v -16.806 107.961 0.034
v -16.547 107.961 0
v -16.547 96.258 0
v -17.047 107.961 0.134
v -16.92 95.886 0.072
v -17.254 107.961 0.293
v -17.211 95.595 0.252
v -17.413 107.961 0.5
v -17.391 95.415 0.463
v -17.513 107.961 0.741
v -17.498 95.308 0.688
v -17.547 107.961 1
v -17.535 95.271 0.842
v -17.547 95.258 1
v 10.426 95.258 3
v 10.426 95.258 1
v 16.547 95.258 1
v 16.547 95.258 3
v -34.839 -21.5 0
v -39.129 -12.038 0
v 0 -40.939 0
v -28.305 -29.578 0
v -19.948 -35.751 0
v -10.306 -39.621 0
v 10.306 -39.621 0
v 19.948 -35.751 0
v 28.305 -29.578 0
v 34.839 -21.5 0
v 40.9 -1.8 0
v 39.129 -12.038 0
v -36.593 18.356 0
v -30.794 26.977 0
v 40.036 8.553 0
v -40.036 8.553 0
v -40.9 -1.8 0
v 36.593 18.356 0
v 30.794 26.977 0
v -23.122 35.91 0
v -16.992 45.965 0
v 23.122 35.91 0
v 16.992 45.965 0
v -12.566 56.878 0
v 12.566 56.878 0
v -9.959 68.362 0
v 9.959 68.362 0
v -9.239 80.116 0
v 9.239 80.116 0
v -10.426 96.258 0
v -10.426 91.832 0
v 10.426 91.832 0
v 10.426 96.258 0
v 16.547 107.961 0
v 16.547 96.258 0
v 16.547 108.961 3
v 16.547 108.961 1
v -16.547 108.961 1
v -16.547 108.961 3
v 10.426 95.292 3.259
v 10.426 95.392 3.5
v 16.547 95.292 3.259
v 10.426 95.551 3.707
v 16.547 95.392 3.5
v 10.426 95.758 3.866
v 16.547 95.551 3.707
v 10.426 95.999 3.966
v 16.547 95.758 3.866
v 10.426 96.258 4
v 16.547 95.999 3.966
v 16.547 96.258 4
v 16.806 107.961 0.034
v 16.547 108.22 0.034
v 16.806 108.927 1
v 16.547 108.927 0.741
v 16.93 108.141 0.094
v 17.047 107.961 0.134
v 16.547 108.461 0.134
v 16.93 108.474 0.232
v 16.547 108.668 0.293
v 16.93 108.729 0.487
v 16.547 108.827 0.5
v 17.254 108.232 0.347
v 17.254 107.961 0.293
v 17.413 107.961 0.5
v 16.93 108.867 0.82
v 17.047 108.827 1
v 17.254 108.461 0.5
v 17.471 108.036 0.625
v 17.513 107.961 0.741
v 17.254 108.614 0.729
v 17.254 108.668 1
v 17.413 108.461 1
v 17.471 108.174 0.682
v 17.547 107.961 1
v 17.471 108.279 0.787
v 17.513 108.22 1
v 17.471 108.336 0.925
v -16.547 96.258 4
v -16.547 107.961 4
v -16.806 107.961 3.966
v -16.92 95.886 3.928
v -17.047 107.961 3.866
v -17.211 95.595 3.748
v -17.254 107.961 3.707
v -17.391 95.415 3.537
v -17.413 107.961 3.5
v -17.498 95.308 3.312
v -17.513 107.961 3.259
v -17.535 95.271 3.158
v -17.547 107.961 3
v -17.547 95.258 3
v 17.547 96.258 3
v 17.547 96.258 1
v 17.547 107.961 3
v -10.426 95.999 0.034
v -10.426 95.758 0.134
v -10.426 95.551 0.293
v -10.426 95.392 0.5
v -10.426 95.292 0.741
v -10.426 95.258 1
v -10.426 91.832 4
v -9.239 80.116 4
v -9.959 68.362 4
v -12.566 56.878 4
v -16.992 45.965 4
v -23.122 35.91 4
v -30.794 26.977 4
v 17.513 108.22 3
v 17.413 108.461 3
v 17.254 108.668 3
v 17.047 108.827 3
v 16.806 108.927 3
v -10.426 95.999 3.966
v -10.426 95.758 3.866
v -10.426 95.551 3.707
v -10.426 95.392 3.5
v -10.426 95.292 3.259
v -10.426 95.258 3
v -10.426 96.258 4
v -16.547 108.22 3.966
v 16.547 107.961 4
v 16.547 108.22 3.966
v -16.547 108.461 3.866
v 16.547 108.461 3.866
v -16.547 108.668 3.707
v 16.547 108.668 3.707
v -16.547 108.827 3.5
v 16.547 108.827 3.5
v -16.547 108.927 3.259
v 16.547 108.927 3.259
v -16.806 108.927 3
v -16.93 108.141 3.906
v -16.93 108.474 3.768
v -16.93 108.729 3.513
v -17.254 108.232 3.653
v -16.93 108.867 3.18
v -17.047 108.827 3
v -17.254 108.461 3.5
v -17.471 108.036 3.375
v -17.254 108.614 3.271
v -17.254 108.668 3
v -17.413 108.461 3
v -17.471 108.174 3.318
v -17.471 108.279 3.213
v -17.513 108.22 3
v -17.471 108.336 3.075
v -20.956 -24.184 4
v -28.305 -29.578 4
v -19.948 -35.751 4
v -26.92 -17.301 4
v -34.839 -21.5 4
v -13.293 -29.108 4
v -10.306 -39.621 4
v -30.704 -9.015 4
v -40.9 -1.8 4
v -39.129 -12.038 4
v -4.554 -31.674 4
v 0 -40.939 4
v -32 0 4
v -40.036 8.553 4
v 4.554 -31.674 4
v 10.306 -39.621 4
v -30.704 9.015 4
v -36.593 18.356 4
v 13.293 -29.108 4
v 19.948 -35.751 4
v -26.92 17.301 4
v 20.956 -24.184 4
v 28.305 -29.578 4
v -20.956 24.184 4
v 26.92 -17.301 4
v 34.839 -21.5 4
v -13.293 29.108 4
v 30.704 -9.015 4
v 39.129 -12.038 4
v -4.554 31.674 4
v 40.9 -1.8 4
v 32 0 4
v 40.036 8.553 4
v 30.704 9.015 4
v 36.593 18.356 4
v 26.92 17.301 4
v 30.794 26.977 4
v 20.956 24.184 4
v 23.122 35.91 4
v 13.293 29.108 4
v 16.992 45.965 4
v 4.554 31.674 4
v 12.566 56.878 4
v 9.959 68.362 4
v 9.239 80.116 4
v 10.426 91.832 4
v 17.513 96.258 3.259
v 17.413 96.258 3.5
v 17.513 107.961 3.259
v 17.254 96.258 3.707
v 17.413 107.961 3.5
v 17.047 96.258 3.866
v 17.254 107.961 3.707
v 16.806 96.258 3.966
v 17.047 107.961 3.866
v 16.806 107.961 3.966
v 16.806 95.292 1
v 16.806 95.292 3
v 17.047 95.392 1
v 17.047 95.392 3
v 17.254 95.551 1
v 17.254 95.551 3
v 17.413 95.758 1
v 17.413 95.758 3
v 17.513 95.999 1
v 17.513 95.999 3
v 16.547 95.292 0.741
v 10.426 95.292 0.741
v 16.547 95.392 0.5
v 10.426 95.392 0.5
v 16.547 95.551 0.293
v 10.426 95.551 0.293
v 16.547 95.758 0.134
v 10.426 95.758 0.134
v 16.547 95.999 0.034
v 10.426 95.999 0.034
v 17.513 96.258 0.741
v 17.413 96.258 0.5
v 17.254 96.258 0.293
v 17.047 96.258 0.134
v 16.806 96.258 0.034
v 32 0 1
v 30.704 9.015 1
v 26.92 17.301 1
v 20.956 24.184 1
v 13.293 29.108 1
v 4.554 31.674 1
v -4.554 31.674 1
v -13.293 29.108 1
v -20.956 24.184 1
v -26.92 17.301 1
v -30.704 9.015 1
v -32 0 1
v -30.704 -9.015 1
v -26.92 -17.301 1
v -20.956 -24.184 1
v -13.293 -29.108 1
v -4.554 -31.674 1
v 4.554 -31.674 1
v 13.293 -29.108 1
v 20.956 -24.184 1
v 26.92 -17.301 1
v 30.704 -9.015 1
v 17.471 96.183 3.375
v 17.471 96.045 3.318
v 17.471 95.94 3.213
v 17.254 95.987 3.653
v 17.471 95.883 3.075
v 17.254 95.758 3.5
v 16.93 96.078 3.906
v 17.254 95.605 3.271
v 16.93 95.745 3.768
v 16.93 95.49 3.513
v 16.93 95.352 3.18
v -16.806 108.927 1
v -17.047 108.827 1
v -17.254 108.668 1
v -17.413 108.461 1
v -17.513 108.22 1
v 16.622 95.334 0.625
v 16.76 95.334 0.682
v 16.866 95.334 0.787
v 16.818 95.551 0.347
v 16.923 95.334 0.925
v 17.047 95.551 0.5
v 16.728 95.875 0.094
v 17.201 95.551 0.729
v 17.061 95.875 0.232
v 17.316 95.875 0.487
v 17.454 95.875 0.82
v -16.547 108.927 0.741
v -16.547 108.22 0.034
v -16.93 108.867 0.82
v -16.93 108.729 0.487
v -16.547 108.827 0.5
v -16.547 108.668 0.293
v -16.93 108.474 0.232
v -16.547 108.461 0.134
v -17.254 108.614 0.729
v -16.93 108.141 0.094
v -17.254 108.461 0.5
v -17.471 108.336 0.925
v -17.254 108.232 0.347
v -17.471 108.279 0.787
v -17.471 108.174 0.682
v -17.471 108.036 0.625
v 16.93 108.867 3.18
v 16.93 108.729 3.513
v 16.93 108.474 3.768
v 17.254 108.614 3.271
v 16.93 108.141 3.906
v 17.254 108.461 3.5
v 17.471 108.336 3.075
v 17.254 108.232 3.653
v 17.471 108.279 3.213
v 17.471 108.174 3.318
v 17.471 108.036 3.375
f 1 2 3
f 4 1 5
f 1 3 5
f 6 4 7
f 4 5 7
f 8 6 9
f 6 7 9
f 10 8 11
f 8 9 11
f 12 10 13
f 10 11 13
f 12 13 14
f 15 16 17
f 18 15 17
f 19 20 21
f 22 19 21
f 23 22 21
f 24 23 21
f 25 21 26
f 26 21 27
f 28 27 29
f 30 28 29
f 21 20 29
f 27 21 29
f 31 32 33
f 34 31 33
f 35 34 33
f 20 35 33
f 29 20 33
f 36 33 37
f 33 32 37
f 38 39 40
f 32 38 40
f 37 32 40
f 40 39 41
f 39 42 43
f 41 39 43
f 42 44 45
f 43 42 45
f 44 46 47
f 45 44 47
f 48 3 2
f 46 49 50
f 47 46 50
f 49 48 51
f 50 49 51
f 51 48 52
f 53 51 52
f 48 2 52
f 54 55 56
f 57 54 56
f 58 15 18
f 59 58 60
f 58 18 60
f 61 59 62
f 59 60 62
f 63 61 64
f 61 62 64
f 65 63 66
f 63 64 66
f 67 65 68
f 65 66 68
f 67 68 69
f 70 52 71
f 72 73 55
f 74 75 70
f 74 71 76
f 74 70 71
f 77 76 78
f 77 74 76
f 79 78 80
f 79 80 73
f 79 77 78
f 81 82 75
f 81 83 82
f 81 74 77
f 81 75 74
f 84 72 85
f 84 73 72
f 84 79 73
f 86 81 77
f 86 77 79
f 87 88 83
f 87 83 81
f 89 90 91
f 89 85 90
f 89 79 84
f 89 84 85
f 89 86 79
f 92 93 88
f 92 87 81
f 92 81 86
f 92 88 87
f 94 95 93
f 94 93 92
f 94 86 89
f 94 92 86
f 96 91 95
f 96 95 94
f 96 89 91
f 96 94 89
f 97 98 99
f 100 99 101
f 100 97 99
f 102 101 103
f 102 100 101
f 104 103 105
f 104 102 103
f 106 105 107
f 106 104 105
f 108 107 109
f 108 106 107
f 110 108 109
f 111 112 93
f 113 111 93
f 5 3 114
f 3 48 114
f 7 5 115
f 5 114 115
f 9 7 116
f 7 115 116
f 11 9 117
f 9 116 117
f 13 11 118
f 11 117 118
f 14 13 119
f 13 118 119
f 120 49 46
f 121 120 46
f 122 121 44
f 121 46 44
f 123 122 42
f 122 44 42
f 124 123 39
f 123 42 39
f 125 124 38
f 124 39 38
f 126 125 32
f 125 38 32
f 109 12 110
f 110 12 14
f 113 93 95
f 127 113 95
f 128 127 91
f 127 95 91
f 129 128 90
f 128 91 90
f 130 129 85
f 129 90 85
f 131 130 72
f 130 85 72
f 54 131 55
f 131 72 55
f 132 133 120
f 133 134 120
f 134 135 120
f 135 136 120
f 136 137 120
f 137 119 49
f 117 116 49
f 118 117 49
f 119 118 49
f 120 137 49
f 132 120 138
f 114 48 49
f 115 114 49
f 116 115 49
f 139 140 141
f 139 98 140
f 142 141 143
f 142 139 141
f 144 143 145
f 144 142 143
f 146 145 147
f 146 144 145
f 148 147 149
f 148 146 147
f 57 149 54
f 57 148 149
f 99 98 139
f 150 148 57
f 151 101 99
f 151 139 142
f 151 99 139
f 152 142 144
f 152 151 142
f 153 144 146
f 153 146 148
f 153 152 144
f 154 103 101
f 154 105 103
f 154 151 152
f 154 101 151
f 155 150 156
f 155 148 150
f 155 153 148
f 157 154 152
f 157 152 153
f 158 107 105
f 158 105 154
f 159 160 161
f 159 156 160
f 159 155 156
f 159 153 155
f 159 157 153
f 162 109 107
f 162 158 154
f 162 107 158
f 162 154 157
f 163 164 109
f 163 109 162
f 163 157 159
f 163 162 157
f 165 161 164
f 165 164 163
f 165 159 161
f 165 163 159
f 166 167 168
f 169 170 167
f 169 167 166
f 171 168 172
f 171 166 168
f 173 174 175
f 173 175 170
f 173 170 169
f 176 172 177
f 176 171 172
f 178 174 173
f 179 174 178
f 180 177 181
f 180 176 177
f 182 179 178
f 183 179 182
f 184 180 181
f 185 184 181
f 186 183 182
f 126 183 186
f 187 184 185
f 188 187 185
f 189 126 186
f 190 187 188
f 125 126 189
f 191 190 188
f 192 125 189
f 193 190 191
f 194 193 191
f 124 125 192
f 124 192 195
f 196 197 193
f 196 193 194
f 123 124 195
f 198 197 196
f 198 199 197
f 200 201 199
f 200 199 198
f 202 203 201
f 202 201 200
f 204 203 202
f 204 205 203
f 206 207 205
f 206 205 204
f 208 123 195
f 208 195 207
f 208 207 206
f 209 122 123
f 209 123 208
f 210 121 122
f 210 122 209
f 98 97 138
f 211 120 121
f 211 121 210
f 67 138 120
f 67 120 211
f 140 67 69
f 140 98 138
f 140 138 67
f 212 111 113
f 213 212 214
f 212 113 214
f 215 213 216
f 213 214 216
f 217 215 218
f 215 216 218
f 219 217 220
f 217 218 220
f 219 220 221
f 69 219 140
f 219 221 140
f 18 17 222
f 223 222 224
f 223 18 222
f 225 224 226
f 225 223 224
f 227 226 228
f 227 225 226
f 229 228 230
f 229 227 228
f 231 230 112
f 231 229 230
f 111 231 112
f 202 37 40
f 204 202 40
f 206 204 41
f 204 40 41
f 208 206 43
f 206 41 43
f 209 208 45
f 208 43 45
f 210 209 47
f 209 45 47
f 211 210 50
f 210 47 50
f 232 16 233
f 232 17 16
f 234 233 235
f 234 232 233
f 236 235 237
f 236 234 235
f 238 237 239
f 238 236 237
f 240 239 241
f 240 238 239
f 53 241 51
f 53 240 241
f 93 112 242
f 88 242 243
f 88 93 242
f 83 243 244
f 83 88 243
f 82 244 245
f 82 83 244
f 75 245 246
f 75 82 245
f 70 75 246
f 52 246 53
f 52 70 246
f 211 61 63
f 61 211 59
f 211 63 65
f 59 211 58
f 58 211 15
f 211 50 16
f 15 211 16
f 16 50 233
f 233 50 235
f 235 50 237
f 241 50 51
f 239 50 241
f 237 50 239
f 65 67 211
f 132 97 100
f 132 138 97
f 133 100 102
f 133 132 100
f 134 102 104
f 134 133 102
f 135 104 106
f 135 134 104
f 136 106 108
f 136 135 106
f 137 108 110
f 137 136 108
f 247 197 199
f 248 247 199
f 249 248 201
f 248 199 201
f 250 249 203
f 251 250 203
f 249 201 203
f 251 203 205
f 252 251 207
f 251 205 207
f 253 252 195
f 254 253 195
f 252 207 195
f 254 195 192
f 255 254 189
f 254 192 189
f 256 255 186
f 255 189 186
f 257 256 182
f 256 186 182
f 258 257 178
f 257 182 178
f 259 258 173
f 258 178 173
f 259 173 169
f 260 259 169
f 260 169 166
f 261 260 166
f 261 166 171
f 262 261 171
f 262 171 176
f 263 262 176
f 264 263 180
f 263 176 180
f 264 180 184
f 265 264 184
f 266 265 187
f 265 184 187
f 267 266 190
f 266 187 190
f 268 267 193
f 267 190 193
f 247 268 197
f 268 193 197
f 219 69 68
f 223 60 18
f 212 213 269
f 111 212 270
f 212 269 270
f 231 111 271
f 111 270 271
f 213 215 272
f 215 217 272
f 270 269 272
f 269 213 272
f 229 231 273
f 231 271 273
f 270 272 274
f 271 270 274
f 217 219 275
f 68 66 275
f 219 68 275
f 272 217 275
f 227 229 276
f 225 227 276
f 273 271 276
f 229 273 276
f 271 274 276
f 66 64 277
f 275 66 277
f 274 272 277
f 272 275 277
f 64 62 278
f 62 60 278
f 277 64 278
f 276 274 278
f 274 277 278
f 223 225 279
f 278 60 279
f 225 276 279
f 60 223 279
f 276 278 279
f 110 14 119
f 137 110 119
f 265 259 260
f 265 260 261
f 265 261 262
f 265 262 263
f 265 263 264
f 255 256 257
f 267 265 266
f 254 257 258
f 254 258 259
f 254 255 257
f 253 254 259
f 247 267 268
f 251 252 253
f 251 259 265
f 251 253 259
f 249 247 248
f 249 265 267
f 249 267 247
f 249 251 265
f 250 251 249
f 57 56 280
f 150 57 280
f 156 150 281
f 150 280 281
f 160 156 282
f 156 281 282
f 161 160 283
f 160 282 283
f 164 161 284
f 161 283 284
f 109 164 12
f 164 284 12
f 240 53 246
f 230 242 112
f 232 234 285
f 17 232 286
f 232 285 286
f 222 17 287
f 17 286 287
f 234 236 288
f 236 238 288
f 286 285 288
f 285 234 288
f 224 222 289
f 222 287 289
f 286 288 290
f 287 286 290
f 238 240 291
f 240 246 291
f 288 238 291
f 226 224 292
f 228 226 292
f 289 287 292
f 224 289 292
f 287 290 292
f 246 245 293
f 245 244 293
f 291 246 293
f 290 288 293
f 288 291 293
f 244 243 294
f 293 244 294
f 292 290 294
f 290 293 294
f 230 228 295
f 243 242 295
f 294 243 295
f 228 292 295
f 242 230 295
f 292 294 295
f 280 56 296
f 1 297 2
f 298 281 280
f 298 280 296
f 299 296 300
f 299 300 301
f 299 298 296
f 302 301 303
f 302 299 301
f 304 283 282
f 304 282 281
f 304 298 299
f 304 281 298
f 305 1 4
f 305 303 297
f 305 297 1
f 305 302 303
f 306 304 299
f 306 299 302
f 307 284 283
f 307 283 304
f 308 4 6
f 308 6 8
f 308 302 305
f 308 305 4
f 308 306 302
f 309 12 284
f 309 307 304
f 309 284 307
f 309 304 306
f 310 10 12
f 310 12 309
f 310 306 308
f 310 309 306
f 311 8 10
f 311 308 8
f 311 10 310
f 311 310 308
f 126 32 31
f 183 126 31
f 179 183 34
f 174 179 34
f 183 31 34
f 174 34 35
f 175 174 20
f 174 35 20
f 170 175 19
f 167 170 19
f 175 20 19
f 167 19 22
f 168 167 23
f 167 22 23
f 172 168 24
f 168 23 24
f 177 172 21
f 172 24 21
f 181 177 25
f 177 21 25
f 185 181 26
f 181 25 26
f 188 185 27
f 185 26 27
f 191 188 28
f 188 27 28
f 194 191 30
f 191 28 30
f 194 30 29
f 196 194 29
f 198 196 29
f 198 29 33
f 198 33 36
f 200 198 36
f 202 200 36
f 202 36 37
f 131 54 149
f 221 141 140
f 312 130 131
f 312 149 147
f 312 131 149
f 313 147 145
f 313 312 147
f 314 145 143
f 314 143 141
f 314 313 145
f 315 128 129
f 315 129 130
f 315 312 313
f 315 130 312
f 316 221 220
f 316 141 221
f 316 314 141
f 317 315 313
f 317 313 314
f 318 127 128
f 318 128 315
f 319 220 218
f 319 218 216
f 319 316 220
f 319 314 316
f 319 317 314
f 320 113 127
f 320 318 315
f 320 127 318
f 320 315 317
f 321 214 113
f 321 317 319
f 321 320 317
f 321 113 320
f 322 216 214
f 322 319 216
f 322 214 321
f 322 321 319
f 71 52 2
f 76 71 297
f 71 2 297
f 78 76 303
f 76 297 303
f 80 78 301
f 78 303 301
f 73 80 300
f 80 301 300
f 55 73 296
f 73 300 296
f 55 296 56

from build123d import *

# Parameters (mm, degrees)
EXTRUDE_2_DEPTH     = 4
SKETCH_5_R          = 32
CUT_EXTRUDE_2_DEPTH = 3
FILLET_7_R          = 1
FILLET_8_R          = 1


with BuildPart() as part:
    # 草图4 → 凸台-拉伸2 (new body)
    with BuildSketch(Plane.XY):
        with BuildLine():
            Line((10.426433706, 95.258075622), (17.547383854, 95.258075622))
            Line((17.547383854, 95.258075622), (17.547383854, 108.961036928))
            Line((17.547383854, 108.961036928), (-17.547383854, 108.961036928))
            Line((-17.547383854, 108.961036928), (-17.547383854, 95.258075622))
            Line((-17.547383854, 95.258075622), (-10.426433706, 95.258075622))
            Line((-10.426433706, 95.258075622), (-10.426433706, 91.831524795))
            ThreePointArc((-10.426433706, 91.831524795), (-12.565979517, 56.877826167), (-30.794002854, 26.976691251))
            ThreePointArc((-30.794002854, 26.976691251), (0, -40.939131434), (30.794002854, 26.976691251))
            ThreePointArc((30.794002854, 26.976691251), (12.565979517, 56.877826167), (10.426433706, 91.831524795))
            Line((10.426433706, 91.831524795), (10.426433706, 95.258075622))
        make_face()
    extrude(amount=EXTRUDE_2_DEPTH)

    # 草图5 → 切除-拉伸2 (cut)
    with BuildSketch(Plane.XY.offset(4)):
        Circle(SKETCH_5_R)
    extrude(amount=-CUT_EXTRUDE_2_DEPTH, mode=Mode.SUBTRACT)

    # 圆角7
    fillet_7_edges = [part.edges().sort_by_distance(p)[0] for p in [
        (-13.98690878, 95.258075622, 0),
        (-17.547383854, 102.109556275, 0),
        (0, 108.961036928, 0),
        (17.547383854, 102.109556275, 0),
        (13.98690878, 95.258075622, 4),
        (13.98690878, 95.258075622, 0),
        (17.547383854, 102.109556275, 4),
        (17.547383854, 95.258075622, 2),
        (0, 108.961036928, 4),
        (-17.547383854, 102.109556275, 4),
        (-13.98690878, 95.258075622, 4),
    ]]
    fillet(fillet_7_edges, radius=FILLET_7_R)

    # 圆角8
    # the kernel refuses this fillet: 1 mm, written as the material it takes off along each edge
    with BuildSketch(Plane(origin=(-16.547383854, 107.961036928, 1), x_dir=(0, 1, 0), z_dir=(-1, 0, 0))) as fillet_8_piece_1_section:
        Polygon((0, 0), (FILLET_8_R, 0), (FILLET_8_R, FILLET_8_R), (0, FILLET_8_R), align=None)
    fillet_8_piece_1 = extrude(amount=FILLET_8_R, mode=Mode.PRIVATE)
    fillet_8_piece_1 = fillet_8_piece_1 - Plane(origin=(-16.547383854, 107.961036928, 1), x_dir=(0, -0.7071067811865475, 0.7071067811865475), z_dir=(-1, 0, 0)) * Sphere(FILLET_8_R, mode=Mode.PRIVATE)
    add(fillet_8_piece_1, mode=Mode.SUBTRACT)
    with BuildSketch(Plane(origin=(16.547383854, 107.961036928, 1), x_dir=(0, 1, 0), z_dir=(1, 0, 0))) as fillet_8_piece_2_section:
        Polygon((0, 0), (FILLET_8_R, 0), (FILLET_8_R, -FILLET_8_R), (0, -FILLET_8_R), align=None)
    fillet_8_piece_2 = extrude(amount=FILLET_8_R, mode=Mode.PRIVATE)
    fillet_8_piece_2 = fillet_8_piece_2 - Plane(origin=(16.547383854, 107.961036928, 1), x_dir=(0, -0.7071067811865475, 0.7071067811865475), z_dir=(1, 0, 0)) * Sphere(FILLET_8_R, mode=Mode.PRIVATE)
    add(fillet_8_piece_2, mode=Mode.SUBTRACT)
    with BuildSketch(Plane(origin=(16.547383854, 107.961036928, 3), x_dir=(0, 1, 0), z_dir=(1, 0, 0))) as fillet_8_piece_3_section:
        Polygon((0, 0), (FILLET_8_R, 0), (FILLET_8_R, FILLET_8_R), (0, FILLET_8_R), align=None)
    fillet_8_piece_3 = extrude(amount=FILLET_8_R, mode=Mode.PRIVATE)
    fillet_8_piece_3 = fillet_8_piece_3 - Plane(origin=(16.547383854, 107.961036928, 3), x_dir=(0, -0.7071067811865475, -0.7071067811865475), z_dir=(1, 0, 0)) * Sphere(FILLET_8_R, mode=Mode.PRIVATE)
    add(fillet_8_piece_3, mode=Mode.SUBTRACT)
    with BuildSketch(Plane(origin=(-16.547383854, 107.961036928, 3), x_dir=(0, 1, 0), z_dir=(-1, 0, 0))) as fillet_8_piece_4_section:
        Polygon((0, 0), (FILLET_8_R, 0), (FILLET_8_R, -FILLET_8_R), (0, -FILLET_8_R), align=None)
    fillet_8_piece_4 = extrude(amount=FILLET_8_R, mode=Mode.PRIVATE)
    fillet_8_piece_4 = fillet_8_piece_4 - Plane(origin=(-16.547383854, 107.961036928, 3), x_dir=(0, -0.7071067811865475, -0.7071067811865475), z_dir=(-1, 0, 0)) * Sphere(FILLET_8_R, mode=Mode.PRIVATE)
    add(fillet_8_piece_4, mode=Mode.SUBTRACT)
    with BuildSketch(Plane(origin=(-17.547383854, 108.961036928, 1), x_dir=(0, -1, 0), z_dir=(0, 0, 1))) as fillet_8_piece_5:
        with BuildLine():
            CenterArc((FILLET_8_R, FILLET_8_R), FILLET_8_R, 180, 90)
            Line((0, FILLET_8_R), (0, 0))
            Line((0, 0), (FILLET_8_R, 0))
        make_face()
    extrude(amount=2, mode=Mode.SUBTRACT)
    with BuildSketch(Plane(origin=(17.547383854, 108.961036928, 1), x_dir=(0, -1, 0), z_dir=(0, 0, 1))) as fillet_8_piece_6:
        with BuildLine():
            CenterArc((FILLET_8_R, -FILLET_8_R), FILLET_8_R, 90, 90)
            Line((0, -FILLET_8_R), (0, 0))
            Line((0, 0), (FILLET_8_R, 0))
        make_face()
    extrude(amount=2, mode=Mode.SUBTRACT)


solid = part.part
